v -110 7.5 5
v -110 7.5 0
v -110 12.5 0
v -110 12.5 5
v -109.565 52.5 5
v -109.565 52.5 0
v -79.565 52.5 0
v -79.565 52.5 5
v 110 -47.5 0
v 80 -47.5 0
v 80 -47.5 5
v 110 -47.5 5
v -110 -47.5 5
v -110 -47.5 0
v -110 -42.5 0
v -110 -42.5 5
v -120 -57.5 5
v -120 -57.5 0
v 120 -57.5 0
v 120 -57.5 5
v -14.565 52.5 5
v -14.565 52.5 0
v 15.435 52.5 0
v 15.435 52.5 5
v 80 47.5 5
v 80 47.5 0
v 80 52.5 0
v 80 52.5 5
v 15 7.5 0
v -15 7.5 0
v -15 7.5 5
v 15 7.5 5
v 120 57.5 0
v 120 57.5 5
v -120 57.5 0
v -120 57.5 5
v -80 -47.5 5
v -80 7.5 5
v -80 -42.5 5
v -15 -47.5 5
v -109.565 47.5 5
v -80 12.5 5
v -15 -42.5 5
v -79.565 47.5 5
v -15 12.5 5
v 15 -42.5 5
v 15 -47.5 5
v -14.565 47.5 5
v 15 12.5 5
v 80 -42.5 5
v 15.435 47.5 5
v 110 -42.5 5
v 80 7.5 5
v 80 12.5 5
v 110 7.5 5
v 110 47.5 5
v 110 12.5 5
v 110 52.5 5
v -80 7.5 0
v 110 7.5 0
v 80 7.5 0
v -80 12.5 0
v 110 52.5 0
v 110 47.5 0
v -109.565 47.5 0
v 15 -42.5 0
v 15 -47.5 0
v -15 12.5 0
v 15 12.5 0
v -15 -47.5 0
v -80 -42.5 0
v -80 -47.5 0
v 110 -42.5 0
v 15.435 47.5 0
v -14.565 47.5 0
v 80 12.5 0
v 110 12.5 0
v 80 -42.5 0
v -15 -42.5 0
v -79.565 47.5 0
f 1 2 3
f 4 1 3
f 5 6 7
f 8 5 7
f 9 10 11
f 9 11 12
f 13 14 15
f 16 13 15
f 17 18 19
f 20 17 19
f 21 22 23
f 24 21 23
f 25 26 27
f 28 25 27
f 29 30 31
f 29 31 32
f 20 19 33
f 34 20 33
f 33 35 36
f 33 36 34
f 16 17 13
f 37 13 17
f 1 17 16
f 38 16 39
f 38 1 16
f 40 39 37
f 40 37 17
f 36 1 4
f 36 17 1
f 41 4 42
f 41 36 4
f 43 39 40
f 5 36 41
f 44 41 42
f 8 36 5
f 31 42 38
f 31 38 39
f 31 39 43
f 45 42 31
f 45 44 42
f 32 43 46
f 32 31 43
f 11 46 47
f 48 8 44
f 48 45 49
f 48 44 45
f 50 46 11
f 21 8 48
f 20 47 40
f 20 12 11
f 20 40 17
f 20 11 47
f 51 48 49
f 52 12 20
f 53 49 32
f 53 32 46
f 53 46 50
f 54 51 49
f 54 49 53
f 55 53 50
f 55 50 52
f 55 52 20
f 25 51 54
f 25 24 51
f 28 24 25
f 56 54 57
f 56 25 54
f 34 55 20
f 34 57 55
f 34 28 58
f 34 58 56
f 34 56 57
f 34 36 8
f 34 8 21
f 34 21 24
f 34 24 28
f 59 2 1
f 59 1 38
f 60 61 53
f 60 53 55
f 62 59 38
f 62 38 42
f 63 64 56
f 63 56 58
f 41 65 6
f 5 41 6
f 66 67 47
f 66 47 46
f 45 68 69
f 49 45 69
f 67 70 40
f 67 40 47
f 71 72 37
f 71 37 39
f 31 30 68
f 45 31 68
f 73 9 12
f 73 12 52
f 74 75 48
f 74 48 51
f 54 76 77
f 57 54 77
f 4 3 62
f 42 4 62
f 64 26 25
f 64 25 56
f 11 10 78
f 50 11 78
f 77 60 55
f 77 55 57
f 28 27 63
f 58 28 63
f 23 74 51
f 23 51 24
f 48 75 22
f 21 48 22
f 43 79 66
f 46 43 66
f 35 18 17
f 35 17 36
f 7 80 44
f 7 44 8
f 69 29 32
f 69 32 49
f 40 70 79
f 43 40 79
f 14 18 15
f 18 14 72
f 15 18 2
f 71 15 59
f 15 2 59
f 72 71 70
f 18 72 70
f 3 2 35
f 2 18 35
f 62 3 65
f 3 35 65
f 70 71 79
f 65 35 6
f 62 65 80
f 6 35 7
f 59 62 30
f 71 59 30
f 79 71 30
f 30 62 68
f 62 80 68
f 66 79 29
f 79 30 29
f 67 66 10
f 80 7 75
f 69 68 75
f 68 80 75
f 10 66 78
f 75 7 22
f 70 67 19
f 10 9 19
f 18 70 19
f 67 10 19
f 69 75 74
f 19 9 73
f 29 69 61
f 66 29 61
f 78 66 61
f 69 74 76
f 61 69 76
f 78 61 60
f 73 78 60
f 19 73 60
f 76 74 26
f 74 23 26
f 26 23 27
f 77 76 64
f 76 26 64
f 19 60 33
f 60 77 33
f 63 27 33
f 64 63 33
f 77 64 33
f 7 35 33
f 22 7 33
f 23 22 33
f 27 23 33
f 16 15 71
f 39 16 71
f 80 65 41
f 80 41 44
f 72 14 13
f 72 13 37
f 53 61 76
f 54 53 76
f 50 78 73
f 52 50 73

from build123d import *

# Parameters (mm, degrees)
SKETCH2_W           = 240
SKETCH2_H           = 115
SKETCH2_W_2         = 30
SKETCH2_H_2         = 5
BOSS_EXTRUDE1_DEPTH = 5


with BuildPart() as part:
    # Sketch2 → Boss-Extrude1 (new body)
    with BuildSketch(Plane.XY):
        Rectangle(SKETCH2_W, SKETCH2_H)
        with Locations((-94.565217391, 50)):
            Rectangle(SKETCH2_W_2, SKETCH2_H_2, mode=Mode.SUBTRACT)
        with Locations((0.434782609, 50)):
            Rectangle(SKETCH2_W_2, SKETCH2_H_2, mode=Mode.SUBTRACT)
        with Locations((95, 50)):
            Rectangle(SKETCH2_W_2, SKETCH2_H_2, mode=Mode.SUBTRACT)
        with Locations((-95, 10)):
            Rectangle(SKETCH2_W_2, SKETCH2_H_2, mode=Mode.SUBTRACT)
        with Locations((0, 10)):
            Rectangle(SKETCH2_W_2, SKETCH2_H_2, mode=Mode.SUBTRACT)
        with Locations((95, 10)):
            Rectangle(SKETCH2_W_2, SKETCH2_H_2, mode=Mode.SUBTRACT)
        with Locations((-95, -45)):
            Rectangle(SKETCH2_W_2, SKETCH2_H_2, mode=Mode.SUBTRACT)
        with Locations((0, -45)):
            Rectangle(SKETCH2_W_2, SKETCH2_H_2, mode=Mode.SUBTRACT)
        with Locations((95, -45)):
            Rectangle(SKETCH2_W_2, SKETCH2_H_2, mode=Mode.SUBTRACT)
    extrude(amount=BOSS_EXTRUDE1_DEPTH)


solid = part.part
